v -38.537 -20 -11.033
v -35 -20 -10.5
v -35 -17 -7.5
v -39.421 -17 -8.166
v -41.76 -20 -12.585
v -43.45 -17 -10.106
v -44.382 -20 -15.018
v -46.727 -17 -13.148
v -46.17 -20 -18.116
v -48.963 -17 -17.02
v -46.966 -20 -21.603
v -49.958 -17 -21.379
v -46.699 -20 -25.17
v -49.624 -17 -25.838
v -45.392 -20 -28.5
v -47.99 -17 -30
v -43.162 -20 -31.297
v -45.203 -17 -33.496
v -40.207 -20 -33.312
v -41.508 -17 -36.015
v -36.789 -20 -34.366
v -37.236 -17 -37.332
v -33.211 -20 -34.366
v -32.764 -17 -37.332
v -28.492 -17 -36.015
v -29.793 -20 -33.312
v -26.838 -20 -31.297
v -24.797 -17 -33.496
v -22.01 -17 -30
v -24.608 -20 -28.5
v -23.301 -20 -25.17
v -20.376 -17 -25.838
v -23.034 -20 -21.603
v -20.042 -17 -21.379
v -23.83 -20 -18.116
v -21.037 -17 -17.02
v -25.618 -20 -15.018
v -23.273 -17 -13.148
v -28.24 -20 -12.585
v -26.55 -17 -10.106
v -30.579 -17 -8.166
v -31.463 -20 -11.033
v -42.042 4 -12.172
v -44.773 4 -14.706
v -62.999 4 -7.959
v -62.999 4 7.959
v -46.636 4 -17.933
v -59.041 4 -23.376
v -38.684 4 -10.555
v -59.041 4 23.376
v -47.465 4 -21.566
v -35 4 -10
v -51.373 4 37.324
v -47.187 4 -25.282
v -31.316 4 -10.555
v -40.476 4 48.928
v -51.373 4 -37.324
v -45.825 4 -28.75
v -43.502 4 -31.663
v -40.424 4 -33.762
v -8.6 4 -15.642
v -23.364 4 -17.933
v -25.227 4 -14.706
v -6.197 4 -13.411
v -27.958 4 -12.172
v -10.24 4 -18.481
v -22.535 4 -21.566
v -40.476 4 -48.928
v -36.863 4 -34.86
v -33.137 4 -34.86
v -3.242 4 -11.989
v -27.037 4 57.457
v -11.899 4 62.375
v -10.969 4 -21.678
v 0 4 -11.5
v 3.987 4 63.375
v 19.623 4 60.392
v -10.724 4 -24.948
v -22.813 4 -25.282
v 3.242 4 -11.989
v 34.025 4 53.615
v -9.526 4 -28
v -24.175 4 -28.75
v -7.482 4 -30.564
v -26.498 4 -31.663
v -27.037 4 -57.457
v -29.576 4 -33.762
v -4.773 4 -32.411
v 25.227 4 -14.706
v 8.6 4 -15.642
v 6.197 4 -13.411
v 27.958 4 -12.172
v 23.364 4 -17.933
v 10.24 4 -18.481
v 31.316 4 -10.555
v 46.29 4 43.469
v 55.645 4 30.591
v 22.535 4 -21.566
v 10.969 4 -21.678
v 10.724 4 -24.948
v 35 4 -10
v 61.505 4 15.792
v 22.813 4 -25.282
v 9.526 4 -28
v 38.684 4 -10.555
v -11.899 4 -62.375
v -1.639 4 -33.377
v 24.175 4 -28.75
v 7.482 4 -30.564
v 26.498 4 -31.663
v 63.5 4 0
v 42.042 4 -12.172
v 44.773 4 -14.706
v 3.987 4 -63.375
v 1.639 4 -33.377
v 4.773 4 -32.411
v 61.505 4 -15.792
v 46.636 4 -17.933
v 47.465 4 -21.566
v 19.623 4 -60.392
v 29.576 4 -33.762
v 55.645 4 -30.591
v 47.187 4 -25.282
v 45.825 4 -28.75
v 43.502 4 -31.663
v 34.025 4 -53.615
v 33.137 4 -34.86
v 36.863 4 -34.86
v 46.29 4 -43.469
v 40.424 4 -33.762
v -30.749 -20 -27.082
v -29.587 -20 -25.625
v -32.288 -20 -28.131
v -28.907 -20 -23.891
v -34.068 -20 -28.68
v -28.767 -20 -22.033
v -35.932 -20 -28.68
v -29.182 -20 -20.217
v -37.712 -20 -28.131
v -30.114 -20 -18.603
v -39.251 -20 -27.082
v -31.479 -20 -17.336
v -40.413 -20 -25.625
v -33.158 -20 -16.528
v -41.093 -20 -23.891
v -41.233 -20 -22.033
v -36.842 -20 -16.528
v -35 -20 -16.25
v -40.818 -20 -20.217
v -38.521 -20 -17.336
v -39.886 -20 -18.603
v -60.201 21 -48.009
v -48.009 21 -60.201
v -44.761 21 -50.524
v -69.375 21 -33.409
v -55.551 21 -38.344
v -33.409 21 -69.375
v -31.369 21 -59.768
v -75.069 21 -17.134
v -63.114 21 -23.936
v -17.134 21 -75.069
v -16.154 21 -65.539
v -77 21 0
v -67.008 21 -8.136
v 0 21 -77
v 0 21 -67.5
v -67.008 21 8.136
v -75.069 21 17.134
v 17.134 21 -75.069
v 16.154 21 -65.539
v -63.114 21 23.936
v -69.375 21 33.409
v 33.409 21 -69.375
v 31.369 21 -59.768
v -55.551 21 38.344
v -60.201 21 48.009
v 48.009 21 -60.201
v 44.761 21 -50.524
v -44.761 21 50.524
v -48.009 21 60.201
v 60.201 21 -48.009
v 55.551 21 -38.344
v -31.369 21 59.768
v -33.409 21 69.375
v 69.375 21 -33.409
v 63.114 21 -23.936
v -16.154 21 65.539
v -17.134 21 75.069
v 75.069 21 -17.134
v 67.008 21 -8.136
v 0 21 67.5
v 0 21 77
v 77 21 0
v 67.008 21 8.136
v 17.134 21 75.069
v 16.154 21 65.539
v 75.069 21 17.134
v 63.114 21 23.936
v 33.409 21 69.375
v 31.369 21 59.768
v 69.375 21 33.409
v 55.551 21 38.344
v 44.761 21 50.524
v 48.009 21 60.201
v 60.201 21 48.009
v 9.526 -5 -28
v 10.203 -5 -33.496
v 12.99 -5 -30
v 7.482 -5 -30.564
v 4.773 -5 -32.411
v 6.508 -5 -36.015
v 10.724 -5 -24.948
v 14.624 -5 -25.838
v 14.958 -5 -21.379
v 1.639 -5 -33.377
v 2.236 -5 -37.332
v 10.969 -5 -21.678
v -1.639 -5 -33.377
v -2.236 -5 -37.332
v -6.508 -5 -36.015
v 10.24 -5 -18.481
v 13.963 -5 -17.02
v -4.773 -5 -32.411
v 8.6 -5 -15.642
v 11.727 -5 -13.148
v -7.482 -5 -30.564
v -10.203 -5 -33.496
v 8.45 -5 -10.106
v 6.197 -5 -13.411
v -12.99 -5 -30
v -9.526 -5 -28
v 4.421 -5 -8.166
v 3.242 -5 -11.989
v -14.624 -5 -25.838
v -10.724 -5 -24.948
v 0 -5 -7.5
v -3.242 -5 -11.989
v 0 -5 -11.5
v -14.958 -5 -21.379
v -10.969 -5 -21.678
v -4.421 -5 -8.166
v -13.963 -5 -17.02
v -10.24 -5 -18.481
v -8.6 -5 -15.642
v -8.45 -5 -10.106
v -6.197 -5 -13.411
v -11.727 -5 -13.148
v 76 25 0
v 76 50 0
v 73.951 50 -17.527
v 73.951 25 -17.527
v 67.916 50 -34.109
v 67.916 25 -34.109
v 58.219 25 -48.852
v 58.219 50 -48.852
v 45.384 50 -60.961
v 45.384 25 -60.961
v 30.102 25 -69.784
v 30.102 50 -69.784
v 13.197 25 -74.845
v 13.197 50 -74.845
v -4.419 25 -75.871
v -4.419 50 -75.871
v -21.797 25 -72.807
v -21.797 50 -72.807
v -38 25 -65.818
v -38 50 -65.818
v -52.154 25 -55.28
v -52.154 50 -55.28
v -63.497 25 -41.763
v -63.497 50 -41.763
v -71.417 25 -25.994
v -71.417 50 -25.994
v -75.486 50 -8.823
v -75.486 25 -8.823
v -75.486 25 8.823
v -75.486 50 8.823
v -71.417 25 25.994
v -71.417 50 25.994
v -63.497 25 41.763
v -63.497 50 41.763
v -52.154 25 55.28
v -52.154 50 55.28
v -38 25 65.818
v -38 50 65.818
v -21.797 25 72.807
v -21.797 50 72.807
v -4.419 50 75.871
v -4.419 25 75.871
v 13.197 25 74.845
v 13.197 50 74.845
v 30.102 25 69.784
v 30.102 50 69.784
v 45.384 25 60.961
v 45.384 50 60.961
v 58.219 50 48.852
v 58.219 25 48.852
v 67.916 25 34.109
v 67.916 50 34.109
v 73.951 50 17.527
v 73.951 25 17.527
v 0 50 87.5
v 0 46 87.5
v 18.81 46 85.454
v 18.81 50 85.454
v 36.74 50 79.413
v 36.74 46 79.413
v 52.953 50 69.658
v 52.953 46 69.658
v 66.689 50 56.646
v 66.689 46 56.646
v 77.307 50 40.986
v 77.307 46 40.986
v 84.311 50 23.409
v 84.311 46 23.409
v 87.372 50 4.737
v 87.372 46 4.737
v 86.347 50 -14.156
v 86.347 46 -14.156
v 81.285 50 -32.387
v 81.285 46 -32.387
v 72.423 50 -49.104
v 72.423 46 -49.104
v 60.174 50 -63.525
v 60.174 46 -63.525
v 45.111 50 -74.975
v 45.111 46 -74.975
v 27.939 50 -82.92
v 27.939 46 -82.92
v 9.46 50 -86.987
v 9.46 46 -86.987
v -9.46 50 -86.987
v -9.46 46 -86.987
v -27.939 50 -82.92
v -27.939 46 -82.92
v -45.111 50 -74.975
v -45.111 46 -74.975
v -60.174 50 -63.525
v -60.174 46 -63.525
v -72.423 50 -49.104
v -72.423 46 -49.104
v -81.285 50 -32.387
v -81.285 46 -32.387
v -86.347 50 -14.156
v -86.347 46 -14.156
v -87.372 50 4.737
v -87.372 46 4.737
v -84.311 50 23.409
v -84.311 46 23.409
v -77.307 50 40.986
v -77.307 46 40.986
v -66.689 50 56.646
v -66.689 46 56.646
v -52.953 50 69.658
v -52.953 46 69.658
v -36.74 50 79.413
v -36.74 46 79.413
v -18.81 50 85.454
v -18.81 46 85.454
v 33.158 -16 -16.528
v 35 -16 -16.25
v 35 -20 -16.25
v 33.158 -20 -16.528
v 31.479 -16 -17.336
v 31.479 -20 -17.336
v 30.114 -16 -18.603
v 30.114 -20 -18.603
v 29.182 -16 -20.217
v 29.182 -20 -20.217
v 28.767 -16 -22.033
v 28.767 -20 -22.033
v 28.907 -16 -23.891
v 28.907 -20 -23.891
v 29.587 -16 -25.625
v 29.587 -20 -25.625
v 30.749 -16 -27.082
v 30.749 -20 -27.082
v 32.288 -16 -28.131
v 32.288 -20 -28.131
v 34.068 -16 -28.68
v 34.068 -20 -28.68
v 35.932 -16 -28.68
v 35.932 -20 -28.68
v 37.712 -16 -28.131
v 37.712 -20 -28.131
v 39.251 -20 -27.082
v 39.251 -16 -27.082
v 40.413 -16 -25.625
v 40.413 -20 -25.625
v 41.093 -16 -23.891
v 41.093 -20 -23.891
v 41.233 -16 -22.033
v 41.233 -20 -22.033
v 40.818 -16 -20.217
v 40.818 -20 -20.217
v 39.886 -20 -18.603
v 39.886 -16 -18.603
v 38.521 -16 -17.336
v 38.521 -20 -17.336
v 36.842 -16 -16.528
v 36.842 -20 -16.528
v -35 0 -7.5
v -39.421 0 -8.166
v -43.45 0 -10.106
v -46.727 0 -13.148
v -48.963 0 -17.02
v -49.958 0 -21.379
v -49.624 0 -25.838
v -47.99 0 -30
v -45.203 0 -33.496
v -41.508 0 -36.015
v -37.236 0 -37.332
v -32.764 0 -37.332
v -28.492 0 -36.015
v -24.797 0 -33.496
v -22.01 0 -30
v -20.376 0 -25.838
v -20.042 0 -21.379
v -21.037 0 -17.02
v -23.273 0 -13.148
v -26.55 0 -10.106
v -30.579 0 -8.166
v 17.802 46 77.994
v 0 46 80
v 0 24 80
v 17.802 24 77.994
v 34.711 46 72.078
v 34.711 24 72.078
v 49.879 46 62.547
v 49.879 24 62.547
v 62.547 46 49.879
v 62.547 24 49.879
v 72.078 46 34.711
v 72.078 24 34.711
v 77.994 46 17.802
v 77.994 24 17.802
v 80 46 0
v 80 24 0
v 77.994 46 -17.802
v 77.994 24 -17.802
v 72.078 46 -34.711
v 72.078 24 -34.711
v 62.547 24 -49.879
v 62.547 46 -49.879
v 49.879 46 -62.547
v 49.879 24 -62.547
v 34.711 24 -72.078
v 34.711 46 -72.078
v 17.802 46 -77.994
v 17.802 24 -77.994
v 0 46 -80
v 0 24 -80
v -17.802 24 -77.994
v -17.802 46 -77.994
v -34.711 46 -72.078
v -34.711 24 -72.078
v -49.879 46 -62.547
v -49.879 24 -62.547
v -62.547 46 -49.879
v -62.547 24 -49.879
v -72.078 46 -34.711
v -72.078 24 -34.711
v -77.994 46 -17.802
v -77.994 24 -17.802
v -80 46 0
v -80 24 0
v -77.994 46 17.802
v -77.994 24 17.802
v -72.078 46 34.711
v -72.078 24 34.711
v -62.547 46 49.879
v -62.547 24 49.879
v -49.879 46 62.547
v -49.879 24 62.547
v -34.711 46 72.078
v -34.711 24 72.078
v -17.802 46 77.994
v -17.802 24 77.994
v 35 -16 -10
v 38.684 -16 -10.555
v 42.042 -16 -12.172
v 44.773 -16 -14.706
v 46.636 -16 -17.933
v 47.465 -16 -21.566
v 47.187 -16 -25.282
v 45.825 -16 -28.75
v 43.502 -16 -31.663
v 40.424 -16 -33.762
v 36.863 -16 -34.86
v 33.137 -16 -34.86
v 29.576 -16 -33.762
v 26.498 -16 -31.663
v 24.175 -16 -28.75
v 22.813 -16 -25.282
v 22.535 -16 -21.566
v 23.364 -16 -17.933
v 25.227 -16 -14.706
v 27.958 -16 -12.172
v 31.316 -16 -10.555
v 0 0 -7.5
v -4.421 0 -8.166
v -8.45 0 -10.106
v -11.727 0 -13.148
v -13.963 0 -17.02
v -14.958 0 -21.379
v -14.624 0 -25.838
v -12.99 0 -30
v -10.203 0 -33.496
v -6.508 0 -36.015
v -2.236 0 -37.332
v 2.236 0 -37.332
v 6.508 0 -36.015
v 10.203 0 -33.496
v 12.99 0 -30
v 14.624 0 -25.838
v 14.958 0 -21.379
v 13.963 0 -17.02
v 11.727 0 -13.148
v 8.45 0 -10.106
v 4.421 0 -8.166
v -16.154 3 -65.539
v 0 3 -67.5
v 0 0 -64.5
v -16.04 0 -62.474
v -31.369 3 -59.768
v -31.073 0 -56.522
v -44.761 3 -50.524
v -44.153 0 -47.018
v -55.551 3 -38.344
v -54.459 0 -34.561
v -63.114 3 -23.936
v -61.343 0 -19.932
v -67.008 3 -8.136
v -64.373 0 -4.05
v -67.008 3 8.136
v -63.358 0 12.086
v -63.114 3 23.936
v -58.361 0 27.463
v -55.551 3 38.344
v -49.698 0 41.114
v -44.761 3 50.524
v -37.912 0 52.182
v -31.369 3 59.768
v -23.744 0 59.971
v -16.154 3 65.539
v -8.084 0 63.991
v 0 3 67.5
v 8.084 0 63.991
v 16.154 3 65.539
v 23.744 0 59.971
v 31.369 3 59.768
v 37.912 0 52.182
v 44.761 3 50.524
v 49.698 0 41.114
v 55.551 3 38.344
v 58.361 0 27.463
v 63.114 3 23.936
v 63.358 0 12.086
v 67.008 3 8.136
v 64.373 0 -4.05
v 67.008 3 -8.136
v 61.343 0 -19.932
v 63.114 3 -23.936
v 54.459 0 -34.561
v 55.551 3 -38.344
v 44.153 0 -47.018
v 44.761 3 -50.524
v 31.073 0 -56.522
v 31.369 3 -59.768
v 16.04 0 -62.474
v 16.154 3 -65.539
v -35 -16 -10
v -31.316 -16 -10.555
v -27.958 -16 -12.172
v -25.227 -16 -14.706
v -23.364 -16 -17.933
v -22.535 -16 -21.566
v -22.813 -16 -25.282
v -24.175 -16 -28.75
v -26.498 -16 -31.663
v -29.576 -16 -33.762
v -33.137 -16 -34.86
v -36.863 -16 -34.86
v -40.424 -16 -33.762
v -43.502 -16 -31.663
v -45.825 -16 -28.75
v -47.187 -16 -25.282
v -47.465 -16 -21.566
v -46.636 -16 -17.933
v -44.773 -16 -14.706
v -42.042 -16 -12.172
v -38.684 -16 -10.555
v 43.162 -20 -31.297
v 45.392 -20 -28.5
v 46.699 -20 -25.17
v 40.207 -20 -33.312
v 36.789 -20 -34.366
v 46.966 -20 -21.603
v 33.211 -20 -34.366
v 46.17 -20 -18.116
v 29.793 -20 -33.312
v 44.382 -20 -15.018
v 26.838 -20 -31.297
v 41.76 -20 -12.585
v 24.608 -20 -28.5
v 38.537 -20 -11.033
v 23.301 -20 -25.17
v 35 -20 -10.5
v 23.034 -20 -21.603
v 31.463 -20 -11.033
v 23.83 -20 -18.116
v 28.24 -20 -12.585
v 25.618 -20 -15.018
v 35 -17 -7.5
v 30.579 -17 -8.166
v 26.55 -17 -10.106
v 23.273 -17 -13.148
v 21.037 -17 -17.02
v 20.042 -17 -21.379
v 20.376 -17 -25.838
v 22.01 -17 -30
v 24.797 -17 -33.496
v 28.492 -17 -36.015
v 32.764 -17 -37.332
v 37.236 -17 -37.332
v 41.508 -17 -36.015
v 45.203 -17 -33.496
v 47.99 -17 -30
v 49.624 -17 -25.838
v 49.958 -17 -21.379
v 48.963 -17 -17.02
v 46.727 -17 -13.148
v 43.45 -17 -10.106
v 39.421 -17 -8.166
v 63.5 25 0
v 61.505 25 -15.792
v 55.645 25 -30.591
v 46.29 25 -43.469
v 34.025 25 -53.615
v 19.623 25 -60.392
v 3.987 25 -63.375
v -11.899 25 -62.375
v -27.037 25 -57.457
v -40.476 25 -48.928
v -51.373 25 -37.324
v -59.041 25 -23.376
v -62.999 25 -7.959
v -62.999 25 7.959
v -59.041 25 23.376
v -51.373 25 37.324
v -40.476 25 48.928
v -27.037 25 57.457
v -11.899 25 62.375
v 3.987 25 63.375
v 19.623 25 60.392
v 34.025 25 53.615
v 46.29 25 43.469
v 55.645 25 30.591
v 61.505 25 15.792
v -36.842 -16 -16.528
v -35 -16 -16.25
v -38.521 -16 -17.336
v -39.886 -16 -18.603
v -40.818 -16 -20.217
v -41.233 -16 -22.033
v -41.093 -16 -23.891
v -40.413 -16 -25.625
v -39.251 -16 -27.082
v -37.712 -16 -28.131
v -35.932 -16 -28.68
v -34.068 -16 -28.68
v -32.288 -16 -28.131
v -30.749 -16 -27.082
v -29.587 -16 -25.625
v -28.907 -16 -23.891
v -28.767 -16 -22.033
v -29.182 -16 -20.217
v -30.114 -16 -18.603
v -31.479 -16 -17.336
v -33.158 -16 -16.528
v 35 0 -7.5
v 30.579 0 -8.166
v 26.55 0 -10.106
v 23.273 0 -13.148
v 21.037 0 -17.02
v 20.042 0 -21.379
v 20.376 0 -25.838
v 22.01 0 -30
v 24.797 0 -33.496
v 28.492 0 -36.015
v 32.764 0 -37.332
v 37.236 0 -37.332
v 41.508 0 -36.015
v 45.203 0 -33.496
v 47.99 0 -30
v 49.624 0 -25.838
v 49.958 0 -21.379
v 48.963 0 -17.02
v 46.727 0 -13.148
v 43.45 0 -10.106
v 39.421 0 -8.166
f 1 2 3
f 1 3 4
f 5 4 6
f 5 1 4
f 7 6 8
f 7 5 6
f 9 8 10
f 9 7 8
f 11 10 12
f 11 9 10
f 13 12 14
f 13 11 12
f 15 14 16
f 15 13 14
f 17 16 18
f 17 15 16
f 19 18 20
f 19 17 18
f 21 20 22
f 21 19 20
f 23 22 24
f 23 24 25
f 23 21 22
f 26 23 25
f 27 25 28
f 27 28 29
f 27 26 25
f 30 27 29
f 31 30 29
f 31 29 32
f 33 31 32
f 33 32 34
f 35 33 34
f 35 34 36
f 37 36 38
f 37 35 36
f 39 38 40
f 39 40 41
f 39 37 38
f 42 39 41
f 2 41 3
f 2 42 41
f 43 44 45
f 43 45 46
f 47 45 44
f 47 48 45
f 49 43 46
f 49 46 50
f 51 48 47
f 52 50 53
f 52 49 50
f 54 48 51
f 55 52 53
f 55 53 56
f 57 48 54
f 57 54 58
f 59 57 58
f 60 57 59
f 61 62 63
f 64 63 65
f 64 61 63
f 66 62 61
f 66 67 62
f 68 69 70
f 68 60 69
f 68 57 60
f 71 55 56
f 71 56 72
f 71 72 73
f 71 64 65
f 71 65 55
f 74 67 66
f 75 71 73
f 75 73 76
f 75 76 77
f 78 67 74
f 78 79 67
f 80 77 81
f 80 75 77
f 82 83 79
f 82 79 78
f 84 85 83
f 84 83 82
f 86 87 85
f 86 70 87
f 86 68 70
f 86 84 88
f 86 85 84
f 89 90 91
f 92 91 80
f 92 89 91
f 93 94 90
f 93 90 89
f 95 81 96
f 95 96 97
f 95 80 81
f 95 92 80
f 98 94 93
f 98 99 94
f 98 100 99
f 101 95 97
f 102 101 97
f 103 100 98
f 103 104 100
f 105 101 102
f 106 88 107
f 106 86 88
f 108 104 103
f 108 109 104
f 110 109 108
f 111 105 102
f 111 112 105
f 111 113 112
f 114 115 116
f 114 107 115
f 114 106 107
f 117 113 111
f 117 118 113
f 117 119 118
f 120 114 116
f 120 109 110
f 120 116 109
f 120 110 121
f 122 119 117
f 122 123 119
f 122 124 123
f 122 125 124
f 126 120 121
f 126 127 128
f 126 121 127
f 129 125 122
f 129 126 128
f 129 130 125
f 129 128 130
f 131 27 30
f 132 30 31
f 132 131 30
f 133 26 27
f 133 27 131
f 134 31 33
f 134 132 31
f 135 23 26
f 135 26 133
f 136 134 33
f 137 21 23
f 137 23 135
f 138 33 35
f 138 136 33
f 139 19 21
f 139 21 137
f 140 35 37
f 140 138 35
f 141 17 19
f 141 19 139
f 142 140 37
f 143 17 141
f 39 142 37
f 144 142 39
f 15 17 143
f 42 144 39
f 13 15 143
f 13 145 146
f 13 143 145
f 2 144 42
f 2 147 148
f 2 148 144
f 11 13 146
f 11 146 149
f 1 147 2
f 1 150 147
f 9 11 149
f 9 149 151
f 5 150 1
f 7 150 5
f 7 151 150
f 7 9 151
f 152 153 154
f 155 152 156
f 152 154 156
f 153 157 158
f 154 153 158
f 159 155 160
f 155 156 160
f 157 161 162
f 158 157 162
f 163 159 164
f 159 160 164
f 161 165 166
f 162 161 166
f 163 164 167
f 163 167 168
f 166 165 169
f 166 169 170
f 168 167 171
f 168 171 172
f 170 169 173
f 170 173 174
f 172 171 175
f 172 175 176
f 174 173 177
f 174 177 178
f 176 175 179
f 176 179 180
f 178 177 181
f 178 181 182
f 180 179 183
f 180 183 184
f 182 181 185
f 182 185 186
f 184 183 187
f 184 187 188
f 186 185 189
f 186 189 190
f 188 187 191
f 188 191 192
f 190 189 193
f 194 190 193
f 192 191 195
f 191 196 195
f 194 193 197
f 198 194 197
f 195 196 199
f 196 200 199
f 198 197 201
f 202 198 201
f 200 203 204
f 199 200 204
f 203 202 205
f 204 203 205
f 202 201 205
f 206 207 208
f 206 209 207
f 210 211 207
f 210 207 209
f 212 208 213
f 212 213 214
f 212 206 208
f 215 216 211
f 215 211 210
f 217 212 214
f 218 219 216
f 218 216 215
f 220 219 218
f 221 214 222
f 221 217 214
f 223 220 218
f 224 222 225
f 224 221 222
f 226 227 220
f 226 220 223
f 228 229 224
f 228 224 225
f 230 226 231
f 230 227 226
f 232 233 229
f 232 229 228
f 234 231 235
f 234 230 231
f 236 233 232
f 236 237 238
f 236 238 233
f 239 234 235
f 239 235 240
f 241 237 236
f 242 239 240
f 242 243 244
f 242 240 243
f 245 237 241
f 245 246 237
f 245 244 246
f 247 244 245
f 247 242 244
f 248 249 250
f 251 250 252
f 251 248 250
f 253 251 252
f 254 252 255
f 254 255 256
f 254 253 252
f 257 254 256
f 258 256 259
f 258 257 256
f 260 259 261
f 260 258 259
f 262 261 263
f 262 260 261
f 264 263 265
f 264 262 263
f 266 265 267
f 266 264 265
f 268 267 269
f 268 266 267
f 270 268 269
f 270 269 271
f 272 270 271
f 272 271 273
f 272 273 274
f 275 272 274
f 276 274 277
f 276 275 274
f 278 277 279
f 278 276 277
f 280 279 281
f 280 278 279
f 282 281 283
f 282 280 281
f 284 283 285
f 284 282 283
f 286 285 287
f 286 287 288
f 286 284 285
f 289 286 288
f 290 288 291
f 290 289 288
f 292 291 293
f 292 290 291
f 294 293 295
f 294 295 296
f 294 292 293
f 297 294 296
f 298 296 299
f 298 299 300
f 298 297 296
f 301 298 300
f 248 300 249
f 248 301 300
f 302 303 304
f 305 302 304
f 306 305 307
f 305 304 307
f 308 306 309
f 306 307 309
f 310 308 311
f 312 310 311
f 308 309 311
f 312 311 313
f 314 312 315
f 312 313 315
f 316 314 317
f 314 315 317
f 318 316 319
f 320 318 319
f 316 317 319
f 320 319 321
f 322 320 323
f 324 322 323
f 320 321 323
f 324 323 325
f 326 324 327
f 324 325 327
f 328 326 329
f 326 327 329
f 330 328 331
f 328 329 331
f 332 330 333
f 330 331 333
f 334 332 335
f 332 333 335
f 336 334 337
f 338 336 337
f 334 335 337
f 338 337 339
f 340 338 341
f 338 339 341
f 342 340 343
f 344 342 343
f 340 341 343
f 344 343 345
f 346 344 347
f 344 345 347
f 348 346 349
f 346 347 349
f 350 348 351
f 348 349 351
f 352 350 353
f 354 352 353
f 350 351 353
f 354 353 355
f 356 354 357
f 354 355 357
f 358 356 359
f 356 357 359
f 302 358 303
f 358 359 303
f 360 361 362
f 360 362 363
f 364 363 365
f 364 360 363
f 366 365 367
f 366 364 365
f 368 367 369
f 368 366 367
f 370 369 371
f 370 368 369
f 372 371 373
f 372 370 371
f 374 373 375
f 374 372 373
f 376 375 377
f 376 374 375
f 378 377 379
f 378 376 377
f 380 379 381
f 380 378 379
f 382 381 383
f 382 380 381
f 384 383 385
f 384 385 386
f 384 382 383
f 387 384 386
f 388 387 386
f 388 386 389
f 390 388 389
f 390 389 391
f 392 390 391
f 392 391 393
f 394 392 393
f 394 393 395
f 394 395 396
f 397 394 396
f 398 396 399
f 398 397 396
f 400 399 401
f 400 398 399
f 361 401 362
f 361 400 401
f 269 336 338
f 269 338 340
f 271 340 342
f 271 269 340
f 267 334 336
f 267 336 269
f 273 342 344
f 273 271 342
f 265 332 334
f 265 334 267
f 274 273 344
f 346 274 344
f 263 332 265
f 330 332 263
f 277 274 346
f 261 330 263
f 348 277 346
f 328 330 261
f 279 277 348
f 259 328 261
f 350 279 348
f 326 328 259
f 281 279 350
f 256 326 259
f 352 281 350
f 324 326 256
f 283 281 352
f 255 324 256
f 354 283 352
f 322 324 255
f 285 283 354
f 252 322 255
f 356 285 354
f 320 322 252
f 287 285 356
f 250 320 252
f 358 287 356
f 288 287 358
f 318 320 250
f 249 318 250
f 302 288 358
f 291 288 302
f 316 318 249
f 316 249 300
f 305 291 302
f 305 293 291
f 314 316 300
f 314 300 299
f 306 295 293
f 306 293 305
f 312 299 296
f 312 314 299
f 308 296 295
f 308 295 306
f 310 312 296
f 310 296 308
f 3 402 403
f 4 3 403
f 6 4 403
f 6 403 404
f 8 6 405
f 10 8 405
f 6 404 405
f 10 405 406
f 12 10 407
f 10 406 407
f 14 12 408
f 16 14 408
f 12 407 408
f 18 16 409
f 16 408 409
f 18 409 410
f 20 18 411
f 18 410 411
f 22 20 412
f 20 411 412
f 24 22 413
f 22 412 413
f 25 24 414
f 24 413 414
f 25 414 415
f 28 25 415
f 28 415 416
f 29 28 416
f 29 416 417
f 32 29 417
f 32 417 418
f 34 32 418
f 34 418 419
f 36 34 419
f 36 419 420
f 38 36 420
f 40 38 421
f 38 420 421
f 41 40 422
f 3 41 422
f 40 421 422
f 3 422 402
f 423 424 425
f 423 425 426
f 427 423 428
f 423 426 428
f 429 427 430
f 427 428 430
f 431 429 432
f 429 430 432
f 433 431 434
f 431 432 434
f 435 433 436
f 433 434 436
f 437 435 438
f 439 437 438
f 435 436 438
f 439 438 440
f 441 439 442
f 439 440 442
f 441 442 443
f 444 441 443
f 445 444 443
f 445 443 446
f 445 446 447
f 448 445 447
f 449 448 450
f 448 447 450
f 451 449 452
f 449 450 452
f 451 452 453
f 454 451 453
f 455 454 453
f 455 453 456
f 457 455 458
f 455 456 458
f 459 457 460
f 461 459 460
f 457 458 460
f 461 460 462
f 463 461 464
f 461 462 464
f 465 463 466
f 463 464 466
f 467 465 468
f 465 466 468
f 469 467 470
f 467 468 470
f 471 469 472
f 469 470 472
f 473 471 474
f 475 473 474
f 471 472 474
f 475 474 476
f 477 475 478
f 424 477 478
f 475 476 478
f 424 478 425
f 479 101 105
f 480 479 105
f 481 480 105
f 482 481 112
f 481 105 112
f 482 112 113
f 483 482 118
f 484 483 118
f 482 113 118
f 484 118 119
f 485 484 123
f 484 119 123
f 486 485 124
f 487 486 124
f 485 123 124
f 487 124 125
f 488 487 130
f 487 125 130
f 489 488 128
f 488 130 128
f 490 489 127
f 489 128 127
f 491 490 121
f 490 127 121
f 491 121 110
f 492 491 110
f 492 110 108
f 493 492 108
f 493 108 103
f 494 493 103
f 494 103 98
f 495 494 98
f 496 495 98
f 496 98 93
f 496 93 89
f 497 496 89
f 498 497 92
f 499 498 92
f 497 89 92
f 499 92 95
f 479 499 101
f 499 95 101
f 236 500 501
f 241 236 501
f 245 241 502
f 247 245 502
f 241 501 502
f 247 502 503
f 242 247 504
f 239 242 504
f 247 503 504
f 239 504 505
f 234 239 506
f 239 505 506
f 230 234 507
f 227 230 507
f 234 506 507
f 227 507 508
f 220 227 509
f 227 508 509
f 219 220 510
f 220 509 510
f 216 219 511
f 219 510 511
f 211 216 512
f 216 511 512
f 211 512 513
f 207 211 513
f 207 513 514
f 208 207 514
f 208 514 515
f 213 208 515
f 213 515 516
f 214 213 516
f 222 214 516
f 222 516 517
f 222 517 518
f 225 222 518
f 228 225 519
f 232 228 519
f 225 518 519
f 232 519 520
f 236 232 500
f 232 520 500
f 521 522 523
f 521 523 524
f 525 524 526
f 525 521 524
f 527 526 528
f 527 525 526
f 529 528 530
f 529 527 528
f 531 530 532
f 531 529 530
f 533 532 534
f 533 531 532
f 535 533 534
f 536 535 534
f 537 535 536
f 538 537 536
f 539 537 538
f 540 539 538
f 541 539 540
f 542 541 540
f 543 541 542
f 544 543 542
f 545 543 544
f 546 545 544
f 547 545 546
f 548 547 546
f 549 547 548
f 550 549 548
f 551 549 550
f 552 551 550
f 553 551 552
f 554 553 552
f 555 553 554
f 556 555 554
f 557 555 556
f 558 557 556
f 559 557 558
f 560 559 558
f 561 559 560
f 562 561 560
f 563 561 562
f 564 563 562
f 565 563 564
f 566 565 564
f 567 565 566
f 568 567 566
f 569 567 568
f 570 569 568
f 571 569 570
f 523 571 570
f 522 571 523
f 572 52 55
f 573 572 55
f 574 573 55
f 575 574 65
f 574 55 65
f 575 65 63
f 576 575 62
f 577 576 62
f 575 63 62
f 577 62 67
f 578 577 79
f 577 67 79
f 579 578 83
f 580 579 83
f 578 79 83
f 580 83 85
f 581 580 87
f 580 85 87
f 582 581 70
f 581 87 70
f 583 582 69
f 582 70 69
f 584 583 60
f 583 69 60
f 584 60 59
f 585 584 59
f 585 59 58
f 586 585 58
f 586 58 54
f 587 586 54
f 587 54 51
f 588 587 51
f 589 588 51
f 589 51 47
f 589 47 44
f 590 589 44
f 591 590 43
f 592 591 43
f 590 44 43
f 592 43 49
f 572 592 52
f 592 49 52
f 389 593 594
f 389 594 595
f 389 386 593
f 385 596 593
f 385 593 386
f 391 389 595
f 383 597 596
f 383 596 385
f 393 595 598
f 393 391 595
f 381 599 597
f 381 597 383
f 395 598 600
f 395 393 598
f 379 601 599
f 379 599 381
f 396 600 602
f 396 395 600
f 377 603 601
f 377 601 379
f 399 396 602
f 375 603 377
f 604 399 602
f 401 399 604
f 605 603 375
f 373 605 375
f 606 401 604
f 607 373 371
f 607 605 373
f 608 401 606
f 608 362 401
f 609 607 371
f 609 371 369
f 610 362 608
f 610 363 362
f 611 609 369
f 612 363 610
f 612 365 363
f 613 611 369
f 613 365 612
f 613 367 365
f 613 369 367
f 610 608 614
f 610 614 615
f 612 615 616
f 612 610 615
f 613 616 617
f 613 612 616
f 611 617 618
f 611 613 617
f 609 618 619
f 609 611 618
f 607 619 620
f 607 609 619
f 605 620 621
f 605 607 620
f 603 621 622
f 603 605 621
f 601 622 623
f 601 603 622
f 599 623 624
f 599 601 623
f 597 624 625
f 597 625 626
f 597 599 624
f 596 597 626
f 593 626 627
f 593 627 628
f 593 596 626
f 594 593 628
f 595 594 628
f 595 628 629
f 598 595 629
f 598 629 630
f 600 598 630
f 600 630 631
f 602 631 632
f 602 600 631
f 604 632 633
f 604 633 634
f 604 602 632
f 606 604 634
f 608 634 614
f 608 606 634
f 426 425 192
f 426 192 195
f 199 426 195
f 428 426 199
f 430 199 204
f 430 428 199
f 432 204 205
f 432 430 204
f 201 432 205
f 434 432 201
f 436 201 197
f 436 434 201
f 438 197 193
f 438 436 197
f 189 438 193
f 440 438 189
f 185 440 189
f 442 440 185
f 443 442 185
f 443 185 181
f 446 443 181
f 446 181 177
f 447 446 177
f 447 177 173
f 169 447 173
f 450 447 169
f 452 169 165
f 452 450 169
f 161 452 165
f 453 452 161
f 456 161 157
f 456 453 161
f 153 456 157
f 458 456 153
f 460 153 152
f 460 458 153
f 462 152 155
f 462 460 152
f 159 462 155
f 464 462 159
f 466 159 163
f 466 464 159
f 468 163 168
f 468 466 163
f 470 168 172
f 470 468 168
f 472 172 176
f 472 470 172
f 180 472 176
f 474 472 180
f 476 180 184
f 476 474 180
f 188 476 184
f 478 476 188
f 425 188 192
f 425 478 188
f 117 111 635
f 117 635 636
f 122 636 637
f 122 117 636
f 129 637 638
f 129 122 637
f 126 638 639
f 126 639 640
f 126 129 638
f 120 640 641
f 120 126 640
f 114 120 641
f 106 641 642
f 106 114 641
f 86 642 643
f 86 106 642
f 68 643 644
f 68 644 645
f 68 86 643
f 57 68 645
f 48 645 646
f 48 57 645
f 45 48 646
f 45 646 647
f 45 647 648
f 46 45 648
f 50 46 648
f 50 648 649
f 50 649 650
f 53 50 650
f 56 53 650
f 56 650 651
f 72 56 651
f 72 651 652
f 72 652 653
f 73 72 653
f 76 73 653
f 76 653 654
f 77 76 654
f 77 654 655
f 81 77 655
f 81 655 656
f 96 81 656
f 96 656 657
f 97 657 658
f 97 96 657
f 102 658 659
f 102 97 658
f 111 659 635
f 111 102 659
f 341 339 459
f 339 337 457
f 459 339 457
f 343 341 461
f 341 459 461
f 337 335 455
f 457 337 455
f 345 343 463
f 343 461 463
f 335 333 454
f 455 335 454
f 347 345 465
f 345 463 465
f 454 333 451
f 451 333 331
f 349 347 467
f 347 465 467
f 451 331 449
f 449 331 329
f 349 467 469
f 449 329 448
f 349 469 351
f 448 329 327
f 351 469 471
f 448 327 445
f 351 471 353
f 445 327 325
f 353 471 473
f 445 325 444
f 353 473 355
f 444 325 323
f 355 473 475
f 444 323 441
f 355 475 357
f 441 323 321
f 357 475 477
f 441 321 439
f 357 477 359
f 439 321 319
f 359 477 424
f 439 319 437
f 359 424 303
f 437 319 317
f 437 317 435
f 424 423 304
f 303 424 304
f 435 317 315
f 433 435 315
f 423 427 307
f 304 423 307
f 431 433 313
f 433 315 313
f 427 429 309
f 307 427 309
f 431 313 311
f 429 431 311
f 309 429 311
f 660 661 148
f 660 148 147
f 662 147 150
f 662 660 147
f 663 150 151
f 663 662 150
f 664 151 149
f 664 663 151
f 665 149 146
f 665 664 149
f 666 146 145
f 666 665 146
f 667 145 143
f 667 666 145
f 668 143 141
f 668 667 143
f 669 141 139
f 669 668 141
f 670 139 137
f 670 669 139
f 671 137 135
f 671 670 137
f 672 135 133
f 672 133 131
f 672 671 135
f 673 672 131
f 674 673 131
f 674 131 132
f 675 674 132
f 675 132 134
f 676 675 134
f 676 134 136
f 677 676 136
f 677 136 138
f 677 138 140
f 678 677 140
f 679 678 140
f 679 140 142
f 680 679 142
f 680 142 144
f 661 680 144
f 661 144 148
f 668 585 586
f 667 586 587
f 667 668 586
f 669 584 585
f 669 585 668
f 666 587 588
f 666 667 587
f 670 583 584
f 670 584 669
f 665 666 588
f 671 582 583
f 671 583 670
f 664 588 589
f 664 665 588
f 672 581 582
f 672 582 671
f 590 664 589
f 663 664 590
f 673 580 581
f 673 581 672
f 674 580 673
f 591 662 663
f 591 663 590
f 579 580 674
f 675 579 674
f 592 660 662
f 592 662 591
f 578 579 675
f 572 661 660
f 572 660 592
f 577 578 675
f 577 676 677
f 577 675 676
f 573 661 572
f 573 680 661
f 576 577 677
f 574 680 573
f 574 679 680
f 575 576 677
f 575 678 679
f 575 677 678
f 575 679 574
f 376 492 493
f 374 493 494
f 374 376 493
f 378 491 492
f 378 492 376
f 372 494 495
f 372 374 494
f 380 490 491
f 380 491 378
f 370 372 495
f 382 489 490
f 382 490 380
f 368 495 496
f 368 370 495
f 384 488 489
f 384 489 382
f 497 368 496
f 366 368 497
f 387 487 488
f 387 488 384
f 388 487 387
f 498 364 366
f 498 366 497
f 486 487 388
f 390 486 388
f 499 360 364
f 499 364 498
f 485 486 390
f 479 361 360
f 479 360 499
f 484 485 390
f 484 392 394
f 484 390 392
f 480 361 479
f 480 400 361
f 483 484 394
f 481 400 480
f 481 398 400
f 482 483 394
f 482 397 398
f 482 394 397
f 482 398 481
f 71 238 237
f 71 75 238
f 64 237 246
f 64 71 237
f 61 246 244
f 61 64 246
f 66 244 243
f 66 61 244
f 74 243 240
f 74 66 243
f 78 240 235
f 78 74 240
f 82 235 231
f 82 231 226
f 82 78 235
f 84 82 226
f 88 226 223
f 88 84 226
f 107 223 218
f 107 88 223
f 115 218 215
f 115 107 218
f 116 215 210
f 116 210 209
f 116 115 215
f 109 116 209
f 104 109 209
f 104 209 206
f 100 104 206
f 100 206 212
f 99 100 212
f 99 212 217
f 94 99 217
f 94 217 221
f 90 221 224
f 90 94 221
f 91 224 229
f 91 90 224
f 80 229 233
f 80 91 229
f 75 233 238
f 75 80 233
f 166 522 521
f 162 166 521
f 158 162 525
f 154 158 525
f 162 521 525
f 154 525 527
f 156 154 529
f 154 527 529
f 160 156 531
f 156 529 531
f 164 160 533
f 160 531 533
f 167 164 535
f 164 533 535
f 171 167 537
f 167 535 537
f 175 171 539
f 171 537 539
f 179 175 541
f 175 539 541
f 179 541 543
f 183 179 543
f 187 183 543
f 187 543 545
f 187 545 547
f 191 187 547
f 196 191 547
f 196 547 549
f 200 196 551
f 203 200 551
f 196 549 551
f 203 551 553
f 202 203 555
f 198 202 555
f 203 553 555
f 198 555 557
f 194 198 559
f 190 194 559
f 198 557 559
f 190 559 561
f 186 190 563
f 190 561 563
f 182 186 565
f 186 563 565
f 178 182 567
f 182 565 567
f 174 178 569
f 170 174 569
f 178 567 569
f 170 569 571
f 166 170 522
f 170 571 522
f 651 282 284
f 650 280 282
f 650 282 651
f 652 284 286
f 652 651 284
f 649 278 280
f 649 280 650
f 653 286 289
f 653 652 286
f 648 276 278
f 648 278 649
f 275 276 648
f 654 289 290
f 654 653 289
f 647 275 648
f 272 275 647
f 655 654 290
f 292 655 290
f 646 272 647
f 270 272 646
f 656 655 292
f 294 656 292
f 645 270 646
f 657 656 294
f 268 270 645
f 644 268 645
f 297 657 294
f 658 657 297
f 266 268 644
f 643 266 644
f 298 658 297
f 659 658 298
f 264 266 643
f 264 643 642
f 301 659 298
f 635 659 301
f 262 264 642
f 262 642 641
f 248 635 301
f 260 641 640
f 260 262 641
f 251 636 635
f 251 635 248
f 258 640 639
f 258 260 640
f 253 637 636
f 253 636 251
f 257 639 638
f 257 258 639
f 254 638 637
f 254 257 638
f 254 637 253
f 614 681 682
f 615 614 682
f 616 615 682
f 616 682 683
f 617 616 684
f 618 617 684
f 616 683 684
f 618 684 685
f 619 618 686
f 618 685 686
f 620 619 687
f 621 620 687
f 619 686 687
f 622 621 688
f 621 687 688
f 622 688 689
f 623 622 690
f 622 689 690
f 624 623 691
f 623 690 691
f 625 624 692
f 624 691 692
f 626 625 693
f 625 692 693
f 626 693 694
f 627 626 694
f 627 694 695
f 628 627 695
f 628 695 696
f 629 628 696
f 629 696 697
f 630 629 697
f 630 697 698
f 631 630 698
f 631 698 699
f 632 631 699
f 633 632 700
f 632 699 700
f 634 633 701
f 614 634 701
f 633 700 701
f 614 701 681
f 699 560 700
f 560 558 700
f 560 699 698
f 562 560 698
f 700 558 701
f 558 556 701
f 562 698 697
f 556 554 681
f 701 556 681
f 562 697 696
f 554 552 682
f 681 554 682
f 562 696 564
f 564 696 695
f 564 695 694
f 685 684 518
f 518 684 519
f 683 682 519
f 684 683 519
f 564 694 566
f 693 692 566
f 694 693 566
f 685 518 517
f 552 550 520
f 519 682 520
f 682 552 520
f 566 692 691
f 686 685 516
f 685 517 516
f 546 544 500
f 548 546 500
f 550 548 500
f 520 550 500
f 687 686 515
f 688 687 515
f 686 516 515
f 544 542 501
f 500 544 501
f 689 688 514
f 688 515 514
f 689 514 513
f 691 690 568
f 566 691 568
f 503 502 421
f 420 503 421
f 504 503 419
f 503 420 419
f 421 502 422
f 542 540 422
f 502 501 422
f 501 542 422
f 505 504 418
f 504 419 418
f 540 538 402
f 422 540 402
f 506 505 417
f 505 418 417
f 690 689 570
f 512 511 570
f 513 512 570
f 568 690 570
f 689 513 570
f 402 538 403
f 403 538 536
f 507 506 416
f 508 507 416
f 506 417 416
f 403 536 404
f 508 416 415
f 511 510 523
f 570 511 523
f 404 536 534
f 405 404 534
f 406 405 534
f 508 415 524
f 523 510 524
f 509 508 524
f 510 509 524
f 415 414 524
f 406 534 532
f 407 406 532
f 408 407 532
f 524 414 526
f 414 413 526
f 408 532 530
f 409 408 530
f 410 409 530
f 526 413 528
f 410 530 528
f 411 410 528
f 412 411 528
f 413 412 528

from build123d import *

# Parameters (mm, degrees)
SKETCH1_R            = 67.5
BOSS_EXTRUDE1_DEPTH  = 21
SKETCH3_R            = 80
BOSS_EXTRUDE2_DEPTH  = 25
SKETCH4_R            = 87.5
BOSS_EXTRUDE3_DEPTH  = 4
SHELL1_START         = 4
SHELL1_OUTLINE_R     = 63.5
SHELL1_DEPTH         = 46
SHELL1_START_2       = 25
SHELL1_2_OUTLINE_R   = 76
SHELL1_2_OUTLINE_R_2 = 63.5
SHELL1_2_DEPTH       = 25
SKETCH2_R            = 11
SKETCH2_R_2          = 6.25
CUT_EXTRUDE1_DEPTH   = 10
SKETCH5_R            = 15
SKETCH5_R_2          = 6.25
BOSS_EXTRUDE4_DEPTH  = 20
SKETCH6_R            = 12.5
CUT_EXTRUDE2_DEPTH   = 20
CHAMFER1_SIZE        = 3
CHAMFER2_SIZE        = 3
SKETCH7_R            = 15
SKETCH7_R_2          = 11
BOSS_EXTRUDE5_DEPTH  = 5


# Read off the part's stored shape, not the designer's step: Shell1
with BuildPart() as part:
    # Sketch1 → Boss-Extrude1 (new body)
    with BuildSketch(Plane(origin=(0, 0, 0), x_dir=(1, 0, 0), z_dir=(0, 1, 0))):
        with Locations(Location((0, 0, 0), (0, 0, 90))):
            Circle(SKETCH1_R)
    extrude(amount=BOSS_EXTRUDE1_DEPTH)

    # Sketch3 → Boss-Extrude2 (add)
    with BuildSketch(Plane(origin=(0, 21, 0), x_dir=(1, 0, 0), z_dir=(0, 1, 0))):
        with Locations(Location((0, 0, 0), (0, 0, 270))):
            Circle(SKETCH3_R)
    extrude(amount=BOSS_EXTRUDE2_DEPTH)

    # Sketch4 → Boss-Extrude3 (add)
    with BuildSketch(Plane(origin=(0, 46, 0), x_dir=(1, 0, 0), z_dir=(0, 1, 0))):
        with Locations(Location((0, 0, 0), (0, 0, 270))):
            Circle(SKETCH4_R)
    extrude(amount=BOSS_EXTRUDE3_DEPTH)

    # Shell1 outline → Shell1 (cut)
    with BuildSketch(Plane(origin=(0, 0, 0), x_dir=(1, 0, 0), z_dir=(0, 1, 0)).offset(SHELL1_START)):
        Circle(SHELL1_OUTLINE_R)
    extrude(amount=SHELL1_DEPTH, mode=Mode.SUBTRACT)

    # Shell1 2 outline → Shell1 2 (cut)
    with BuildSketch(Plane(origin=(0, 0, 0), x_dir=(1, 0, 0), z_dir=(0, 1, 0)).offset(SHELL1_START_2)):
        Circle(SHELL1_2_OUTLINE_R)
        Circle(SHELL1_2_OUTLINE_R_2, mode=Mode.SUBTRACT)
    extrude(amount=SHELL1_2_DEPTH, mode=Mode.SUBTRACT)

    # Sketch2 → Cut-Extrude1 (cut)
    with BuildSketch(Plane(origin=(0, 4, 0), x_dir=(1, 0, 0), z_dir=(0, 1, 0))):
        with Locations(Location((0, 22.5, 0), (0, 0, 270))):
            Circle(SKETCH2_R)
        with Locations(Location((-35, 22.5, 0), (0, 0, 270))):
            Circle(SKETCH2_R_2)
        with Locations(Location((35, 22.5, 0), (0, 0, 270))):
            Circle(SKETCH2_R_2)
    extrude(amount=-CUT_EXTRUDE1_DEPTH, mode=Mode.SUBTRACT)

    # Sketch5 → Boss-Extrude4 (add)
    # profile 1 of 2: a face of its own
    with BuildSketch(Plane.XZ):
        with Locations(Location((35, -22.5, 0), (0, 0, 90))):
            Circle(SKETCH5_R)
        with Locations(Location((35, -22.5, 0), (0, 0, 90))):
            Circle(SKETCH5_R_2, mode=Mode.SUBTRACT)
    # profile 2 of 2: a face of its own
    with BuildSketch(Plane.XZ):
        with Locations(Location((-35, -22.5, 0), (0, 0, 90))):
            Circle(SKETCH5_R)
        with Locations(Location((-35, -22.5, 0), (0, 0, 90))):
            Circle(SKETCH5_R_2, mode=Mode.SUBTRACT)
    extrude(amount=BOSS_EXTRUDE4_DEPTH)

    # Sketch6 → Cut-Extrude2 (cut)
    with BuildSketch(Plane(origin=(0, 4, 0), x_dir=(1, 0, 0), z_dir=(0, 1, 0))):
        with Locations(Location((-35, 22.5, 0), (0, 0, 270))):
            Circle(SKETCH6_R)
        with Locations(Location((35, 22.5, 0), (0, 0, 270))):
            Circle(SKETCH6_R)
    extrude(amount=-CUT_EXTRUDE2_DEPTH, mode=Mode.SUBTRACT)

    # Chamfer1
    chamfer1_edges = [part.edges().sort_by_distance(p)[0] for p in [
        (0, 0, 67.5),
        (0, 21, -80),
    ]]
    chamfer(chamfer1_edges, length=CHAMFER1_SIZE)

    # Chamfer2
    chamfer2_edges = [part.edges().sort_by_distance(p)[0] for p in [
        (35, -20, -37.5),
        (-35, -20, -37.5),
    ]]
    chamfer(chamfer2_edges, length=CHAMFER2_SIZE)

    # Sketch7 → Boss-Extrude5 (add)
    with BuildSketch(Plane.XZ):
        with Locations(Location((0, -22.5, 0), (0, 0, 90))):
            Circle(SKETCH7_R)
        with Locations(Location((0, -22.5, 0), (0, 0, 90))):
            Circle(SKETCH7_R_2, mode=Mode.SUBTRACT)
    extrude(amount=BOSS_EXTRUDE5_DEPTH)


solid = part.part
